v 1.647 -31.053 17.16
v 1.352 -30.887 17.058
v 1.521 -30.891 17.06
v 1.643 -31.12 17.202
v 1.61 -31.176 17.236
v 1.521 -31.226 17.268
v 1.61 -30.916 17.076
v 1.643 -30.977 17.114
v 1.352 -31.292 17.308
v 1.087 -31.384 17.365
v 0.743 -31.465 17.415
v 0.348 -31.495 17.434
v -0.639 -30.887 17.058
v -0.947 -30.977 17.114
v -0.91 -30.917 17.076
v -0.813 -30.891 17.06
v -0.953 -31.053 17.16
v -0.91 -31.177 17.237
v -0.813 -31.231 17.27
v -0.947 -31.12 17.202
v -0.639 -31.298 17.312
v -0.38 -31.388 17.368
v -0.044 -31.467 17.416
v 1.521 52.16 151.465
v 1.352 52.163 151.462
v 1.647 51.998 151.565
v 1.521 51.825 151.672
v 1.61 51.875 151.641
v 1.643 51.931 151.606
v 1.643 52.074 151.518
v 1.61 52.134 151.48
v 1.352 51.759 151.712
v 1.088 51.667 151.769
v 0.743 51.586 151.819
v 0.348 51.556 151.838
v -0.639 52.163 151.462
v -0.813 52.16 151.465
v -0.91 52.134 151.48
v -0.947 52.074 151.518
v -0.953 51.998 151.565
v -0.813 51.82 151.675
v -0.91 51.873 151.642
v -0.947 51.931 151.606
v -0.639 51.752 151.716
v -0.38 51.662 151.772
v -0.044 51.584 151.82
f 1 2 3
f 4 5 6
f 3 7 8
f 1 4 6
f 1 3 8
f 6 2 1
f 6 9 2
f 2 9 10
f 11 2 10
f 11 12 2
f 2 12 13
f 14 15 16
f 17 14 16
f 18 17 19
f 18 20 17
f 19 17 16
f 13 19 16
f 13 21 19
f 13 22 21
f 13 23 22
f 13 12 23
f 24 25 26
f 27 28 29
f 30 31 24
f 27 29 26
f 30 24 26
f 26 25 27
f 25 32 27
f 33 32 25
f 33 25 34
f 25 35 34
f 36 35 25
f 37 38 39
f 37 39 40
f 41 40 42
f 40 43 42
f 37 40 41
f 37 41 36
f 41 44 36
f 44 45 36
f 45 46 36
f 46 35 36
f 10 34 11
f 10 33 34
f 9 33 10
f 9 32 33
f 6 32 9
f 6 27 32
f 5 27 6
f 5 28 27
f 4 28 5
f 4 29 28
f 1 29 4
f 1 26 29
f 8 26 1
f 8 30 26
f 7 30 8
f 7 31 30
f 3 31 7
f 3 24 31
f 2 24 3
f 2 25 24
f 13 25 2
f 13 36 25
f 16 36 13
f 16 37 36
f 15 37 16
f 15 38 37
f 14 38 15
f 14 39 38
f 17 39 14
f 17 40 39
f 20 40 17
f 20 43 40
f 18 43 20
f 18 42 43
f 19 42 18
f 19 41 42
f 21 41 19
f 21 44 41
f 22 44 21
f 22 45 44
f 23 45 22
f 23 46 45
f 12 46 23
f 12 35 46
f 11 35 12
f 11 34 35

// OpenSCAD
// sb_harp_wood_plank.scad
// Soundbox part: harp_wood_plank
//
// Construction: FLAT/THIN BAR -> linear_extrude of a constant cross-section.
// Justification from the analysis JSON:
//   obb_dims = [157.99, 2.60, 0.715]  (along principal axes e0, e1, e2).
//   The long axis e0 (157.99) >> the other two. Sections are sliced along e0
//   (s from -79.00 .. +78.99). All 7 cross-section outlines (outline_e1e2) are
//   essentially IDENTICAL: e1 spans +/-1.30 (width 2.60), e2 spans -0.481..0.234
//   (thickness ~0.715). So the profile is a constant 2D outline in the (e1,e2)
//   plane swept along e0  -> linear_extrude of that single outline.
//
// Local frame (per shared contract): x = e1, y = e2, z = e0.
//   world = centroid + x*e1 + y*e2 + z*e0
//   multmatrix columns: [e1, e2, e0, centroid]

module sb_harp_wood_plank() {
    // --- key dimensions (model world units) ---
    length_e0   = 157.99349936504035; // long axis extent (OBB dim along e0)
    s_min       = -79.00199779074894; // start of sweep along e0
    // width along e1 ~ 2.60, thickness along e2 ~ 0.715 are encoded in the outline

    // Representative constant cross-section in the (e1=x, e2=y) plane,
    // taken from the central section s ~= 0 (n_pts = 25).
    profile = [
        [-1.304068613138129,   0.039914452730746675],
        [-1.2988414417338716, -0.03920977952225879],
        [-1.2619292589382591, -0.10661357487112998],
        [-1.1647280374804423, -0.1698429468966287],
        [-0.99087463649703,   -0.24914266551218311],
        [-0.7315022194947558, -0.3551233613066156],
        [-0.3954583800005634, -0.44727456985152614],
        [-0.0038031597561305947, -0.48089703076206947],
        [ 0.3912742338218062, -0.4458243328934035],
        [ 0.73588004868243,   -0.3504180548228808],
        [ 1.0004441501844406, -0.24255720658648894],
        [ 1.1693076613345343, -0.16573332753383863],
        [ 1.2581205347344715, -0.10634987031153553],
        [ 1.2911667131536821, -0.0407195898591004],
        [ 1.295934128762341,   0.03816542762517994],
        [ 1.2912792546972822,  0.1270234519437894],
        [ 1.2912761508157018,  0.12705869741439013],
        [ 1.2583218280177508,  0.19833928175529536],
        [ 1.1695688953365784,  0.22829787676322244],
        [ 1.0007615422199547,  0.23266994191751955],
        [ 0.7362698133269031,  0.23285942284119],
        [-0.9904897736221766,  0.23400989818133677],
        [-1.164417047013931,   0.22985412235596048],
        [-1.26171150515054,    0.20002350118136558],
        [-1.2987277245542947,  0.12877525746163343]
    ];

    // Place the part at its original world coords.
    // multmatrix([[e1x,e2x,e0x,cx],[e1y,e2y,e0y,cy],[e1z,e2z,e0z,cz],[0,0,0,1]])
    multmatrix([
        [ 0.9999997748485234,    -0.0006710461244862703,  3.807473468457577e-08, 0.3513917557574726],
        [ 0.0005708356524937477,  0.8506949335985642,     0.5256593993227865,   10.44220652615824],
        [-0.0003527740926992308, -0.5256592809480621,     0.8506951251203959,   84.38742842926786],
        [ 0, 0, 0, 1]
    ]) {
        // Sweep the constant profile along z (= e0).
        translate([0, 0, s_min])
            linear_extrude(height = length_e0)
                polygon(points = profile);
    }
}

sb_harp_wood_plank();
